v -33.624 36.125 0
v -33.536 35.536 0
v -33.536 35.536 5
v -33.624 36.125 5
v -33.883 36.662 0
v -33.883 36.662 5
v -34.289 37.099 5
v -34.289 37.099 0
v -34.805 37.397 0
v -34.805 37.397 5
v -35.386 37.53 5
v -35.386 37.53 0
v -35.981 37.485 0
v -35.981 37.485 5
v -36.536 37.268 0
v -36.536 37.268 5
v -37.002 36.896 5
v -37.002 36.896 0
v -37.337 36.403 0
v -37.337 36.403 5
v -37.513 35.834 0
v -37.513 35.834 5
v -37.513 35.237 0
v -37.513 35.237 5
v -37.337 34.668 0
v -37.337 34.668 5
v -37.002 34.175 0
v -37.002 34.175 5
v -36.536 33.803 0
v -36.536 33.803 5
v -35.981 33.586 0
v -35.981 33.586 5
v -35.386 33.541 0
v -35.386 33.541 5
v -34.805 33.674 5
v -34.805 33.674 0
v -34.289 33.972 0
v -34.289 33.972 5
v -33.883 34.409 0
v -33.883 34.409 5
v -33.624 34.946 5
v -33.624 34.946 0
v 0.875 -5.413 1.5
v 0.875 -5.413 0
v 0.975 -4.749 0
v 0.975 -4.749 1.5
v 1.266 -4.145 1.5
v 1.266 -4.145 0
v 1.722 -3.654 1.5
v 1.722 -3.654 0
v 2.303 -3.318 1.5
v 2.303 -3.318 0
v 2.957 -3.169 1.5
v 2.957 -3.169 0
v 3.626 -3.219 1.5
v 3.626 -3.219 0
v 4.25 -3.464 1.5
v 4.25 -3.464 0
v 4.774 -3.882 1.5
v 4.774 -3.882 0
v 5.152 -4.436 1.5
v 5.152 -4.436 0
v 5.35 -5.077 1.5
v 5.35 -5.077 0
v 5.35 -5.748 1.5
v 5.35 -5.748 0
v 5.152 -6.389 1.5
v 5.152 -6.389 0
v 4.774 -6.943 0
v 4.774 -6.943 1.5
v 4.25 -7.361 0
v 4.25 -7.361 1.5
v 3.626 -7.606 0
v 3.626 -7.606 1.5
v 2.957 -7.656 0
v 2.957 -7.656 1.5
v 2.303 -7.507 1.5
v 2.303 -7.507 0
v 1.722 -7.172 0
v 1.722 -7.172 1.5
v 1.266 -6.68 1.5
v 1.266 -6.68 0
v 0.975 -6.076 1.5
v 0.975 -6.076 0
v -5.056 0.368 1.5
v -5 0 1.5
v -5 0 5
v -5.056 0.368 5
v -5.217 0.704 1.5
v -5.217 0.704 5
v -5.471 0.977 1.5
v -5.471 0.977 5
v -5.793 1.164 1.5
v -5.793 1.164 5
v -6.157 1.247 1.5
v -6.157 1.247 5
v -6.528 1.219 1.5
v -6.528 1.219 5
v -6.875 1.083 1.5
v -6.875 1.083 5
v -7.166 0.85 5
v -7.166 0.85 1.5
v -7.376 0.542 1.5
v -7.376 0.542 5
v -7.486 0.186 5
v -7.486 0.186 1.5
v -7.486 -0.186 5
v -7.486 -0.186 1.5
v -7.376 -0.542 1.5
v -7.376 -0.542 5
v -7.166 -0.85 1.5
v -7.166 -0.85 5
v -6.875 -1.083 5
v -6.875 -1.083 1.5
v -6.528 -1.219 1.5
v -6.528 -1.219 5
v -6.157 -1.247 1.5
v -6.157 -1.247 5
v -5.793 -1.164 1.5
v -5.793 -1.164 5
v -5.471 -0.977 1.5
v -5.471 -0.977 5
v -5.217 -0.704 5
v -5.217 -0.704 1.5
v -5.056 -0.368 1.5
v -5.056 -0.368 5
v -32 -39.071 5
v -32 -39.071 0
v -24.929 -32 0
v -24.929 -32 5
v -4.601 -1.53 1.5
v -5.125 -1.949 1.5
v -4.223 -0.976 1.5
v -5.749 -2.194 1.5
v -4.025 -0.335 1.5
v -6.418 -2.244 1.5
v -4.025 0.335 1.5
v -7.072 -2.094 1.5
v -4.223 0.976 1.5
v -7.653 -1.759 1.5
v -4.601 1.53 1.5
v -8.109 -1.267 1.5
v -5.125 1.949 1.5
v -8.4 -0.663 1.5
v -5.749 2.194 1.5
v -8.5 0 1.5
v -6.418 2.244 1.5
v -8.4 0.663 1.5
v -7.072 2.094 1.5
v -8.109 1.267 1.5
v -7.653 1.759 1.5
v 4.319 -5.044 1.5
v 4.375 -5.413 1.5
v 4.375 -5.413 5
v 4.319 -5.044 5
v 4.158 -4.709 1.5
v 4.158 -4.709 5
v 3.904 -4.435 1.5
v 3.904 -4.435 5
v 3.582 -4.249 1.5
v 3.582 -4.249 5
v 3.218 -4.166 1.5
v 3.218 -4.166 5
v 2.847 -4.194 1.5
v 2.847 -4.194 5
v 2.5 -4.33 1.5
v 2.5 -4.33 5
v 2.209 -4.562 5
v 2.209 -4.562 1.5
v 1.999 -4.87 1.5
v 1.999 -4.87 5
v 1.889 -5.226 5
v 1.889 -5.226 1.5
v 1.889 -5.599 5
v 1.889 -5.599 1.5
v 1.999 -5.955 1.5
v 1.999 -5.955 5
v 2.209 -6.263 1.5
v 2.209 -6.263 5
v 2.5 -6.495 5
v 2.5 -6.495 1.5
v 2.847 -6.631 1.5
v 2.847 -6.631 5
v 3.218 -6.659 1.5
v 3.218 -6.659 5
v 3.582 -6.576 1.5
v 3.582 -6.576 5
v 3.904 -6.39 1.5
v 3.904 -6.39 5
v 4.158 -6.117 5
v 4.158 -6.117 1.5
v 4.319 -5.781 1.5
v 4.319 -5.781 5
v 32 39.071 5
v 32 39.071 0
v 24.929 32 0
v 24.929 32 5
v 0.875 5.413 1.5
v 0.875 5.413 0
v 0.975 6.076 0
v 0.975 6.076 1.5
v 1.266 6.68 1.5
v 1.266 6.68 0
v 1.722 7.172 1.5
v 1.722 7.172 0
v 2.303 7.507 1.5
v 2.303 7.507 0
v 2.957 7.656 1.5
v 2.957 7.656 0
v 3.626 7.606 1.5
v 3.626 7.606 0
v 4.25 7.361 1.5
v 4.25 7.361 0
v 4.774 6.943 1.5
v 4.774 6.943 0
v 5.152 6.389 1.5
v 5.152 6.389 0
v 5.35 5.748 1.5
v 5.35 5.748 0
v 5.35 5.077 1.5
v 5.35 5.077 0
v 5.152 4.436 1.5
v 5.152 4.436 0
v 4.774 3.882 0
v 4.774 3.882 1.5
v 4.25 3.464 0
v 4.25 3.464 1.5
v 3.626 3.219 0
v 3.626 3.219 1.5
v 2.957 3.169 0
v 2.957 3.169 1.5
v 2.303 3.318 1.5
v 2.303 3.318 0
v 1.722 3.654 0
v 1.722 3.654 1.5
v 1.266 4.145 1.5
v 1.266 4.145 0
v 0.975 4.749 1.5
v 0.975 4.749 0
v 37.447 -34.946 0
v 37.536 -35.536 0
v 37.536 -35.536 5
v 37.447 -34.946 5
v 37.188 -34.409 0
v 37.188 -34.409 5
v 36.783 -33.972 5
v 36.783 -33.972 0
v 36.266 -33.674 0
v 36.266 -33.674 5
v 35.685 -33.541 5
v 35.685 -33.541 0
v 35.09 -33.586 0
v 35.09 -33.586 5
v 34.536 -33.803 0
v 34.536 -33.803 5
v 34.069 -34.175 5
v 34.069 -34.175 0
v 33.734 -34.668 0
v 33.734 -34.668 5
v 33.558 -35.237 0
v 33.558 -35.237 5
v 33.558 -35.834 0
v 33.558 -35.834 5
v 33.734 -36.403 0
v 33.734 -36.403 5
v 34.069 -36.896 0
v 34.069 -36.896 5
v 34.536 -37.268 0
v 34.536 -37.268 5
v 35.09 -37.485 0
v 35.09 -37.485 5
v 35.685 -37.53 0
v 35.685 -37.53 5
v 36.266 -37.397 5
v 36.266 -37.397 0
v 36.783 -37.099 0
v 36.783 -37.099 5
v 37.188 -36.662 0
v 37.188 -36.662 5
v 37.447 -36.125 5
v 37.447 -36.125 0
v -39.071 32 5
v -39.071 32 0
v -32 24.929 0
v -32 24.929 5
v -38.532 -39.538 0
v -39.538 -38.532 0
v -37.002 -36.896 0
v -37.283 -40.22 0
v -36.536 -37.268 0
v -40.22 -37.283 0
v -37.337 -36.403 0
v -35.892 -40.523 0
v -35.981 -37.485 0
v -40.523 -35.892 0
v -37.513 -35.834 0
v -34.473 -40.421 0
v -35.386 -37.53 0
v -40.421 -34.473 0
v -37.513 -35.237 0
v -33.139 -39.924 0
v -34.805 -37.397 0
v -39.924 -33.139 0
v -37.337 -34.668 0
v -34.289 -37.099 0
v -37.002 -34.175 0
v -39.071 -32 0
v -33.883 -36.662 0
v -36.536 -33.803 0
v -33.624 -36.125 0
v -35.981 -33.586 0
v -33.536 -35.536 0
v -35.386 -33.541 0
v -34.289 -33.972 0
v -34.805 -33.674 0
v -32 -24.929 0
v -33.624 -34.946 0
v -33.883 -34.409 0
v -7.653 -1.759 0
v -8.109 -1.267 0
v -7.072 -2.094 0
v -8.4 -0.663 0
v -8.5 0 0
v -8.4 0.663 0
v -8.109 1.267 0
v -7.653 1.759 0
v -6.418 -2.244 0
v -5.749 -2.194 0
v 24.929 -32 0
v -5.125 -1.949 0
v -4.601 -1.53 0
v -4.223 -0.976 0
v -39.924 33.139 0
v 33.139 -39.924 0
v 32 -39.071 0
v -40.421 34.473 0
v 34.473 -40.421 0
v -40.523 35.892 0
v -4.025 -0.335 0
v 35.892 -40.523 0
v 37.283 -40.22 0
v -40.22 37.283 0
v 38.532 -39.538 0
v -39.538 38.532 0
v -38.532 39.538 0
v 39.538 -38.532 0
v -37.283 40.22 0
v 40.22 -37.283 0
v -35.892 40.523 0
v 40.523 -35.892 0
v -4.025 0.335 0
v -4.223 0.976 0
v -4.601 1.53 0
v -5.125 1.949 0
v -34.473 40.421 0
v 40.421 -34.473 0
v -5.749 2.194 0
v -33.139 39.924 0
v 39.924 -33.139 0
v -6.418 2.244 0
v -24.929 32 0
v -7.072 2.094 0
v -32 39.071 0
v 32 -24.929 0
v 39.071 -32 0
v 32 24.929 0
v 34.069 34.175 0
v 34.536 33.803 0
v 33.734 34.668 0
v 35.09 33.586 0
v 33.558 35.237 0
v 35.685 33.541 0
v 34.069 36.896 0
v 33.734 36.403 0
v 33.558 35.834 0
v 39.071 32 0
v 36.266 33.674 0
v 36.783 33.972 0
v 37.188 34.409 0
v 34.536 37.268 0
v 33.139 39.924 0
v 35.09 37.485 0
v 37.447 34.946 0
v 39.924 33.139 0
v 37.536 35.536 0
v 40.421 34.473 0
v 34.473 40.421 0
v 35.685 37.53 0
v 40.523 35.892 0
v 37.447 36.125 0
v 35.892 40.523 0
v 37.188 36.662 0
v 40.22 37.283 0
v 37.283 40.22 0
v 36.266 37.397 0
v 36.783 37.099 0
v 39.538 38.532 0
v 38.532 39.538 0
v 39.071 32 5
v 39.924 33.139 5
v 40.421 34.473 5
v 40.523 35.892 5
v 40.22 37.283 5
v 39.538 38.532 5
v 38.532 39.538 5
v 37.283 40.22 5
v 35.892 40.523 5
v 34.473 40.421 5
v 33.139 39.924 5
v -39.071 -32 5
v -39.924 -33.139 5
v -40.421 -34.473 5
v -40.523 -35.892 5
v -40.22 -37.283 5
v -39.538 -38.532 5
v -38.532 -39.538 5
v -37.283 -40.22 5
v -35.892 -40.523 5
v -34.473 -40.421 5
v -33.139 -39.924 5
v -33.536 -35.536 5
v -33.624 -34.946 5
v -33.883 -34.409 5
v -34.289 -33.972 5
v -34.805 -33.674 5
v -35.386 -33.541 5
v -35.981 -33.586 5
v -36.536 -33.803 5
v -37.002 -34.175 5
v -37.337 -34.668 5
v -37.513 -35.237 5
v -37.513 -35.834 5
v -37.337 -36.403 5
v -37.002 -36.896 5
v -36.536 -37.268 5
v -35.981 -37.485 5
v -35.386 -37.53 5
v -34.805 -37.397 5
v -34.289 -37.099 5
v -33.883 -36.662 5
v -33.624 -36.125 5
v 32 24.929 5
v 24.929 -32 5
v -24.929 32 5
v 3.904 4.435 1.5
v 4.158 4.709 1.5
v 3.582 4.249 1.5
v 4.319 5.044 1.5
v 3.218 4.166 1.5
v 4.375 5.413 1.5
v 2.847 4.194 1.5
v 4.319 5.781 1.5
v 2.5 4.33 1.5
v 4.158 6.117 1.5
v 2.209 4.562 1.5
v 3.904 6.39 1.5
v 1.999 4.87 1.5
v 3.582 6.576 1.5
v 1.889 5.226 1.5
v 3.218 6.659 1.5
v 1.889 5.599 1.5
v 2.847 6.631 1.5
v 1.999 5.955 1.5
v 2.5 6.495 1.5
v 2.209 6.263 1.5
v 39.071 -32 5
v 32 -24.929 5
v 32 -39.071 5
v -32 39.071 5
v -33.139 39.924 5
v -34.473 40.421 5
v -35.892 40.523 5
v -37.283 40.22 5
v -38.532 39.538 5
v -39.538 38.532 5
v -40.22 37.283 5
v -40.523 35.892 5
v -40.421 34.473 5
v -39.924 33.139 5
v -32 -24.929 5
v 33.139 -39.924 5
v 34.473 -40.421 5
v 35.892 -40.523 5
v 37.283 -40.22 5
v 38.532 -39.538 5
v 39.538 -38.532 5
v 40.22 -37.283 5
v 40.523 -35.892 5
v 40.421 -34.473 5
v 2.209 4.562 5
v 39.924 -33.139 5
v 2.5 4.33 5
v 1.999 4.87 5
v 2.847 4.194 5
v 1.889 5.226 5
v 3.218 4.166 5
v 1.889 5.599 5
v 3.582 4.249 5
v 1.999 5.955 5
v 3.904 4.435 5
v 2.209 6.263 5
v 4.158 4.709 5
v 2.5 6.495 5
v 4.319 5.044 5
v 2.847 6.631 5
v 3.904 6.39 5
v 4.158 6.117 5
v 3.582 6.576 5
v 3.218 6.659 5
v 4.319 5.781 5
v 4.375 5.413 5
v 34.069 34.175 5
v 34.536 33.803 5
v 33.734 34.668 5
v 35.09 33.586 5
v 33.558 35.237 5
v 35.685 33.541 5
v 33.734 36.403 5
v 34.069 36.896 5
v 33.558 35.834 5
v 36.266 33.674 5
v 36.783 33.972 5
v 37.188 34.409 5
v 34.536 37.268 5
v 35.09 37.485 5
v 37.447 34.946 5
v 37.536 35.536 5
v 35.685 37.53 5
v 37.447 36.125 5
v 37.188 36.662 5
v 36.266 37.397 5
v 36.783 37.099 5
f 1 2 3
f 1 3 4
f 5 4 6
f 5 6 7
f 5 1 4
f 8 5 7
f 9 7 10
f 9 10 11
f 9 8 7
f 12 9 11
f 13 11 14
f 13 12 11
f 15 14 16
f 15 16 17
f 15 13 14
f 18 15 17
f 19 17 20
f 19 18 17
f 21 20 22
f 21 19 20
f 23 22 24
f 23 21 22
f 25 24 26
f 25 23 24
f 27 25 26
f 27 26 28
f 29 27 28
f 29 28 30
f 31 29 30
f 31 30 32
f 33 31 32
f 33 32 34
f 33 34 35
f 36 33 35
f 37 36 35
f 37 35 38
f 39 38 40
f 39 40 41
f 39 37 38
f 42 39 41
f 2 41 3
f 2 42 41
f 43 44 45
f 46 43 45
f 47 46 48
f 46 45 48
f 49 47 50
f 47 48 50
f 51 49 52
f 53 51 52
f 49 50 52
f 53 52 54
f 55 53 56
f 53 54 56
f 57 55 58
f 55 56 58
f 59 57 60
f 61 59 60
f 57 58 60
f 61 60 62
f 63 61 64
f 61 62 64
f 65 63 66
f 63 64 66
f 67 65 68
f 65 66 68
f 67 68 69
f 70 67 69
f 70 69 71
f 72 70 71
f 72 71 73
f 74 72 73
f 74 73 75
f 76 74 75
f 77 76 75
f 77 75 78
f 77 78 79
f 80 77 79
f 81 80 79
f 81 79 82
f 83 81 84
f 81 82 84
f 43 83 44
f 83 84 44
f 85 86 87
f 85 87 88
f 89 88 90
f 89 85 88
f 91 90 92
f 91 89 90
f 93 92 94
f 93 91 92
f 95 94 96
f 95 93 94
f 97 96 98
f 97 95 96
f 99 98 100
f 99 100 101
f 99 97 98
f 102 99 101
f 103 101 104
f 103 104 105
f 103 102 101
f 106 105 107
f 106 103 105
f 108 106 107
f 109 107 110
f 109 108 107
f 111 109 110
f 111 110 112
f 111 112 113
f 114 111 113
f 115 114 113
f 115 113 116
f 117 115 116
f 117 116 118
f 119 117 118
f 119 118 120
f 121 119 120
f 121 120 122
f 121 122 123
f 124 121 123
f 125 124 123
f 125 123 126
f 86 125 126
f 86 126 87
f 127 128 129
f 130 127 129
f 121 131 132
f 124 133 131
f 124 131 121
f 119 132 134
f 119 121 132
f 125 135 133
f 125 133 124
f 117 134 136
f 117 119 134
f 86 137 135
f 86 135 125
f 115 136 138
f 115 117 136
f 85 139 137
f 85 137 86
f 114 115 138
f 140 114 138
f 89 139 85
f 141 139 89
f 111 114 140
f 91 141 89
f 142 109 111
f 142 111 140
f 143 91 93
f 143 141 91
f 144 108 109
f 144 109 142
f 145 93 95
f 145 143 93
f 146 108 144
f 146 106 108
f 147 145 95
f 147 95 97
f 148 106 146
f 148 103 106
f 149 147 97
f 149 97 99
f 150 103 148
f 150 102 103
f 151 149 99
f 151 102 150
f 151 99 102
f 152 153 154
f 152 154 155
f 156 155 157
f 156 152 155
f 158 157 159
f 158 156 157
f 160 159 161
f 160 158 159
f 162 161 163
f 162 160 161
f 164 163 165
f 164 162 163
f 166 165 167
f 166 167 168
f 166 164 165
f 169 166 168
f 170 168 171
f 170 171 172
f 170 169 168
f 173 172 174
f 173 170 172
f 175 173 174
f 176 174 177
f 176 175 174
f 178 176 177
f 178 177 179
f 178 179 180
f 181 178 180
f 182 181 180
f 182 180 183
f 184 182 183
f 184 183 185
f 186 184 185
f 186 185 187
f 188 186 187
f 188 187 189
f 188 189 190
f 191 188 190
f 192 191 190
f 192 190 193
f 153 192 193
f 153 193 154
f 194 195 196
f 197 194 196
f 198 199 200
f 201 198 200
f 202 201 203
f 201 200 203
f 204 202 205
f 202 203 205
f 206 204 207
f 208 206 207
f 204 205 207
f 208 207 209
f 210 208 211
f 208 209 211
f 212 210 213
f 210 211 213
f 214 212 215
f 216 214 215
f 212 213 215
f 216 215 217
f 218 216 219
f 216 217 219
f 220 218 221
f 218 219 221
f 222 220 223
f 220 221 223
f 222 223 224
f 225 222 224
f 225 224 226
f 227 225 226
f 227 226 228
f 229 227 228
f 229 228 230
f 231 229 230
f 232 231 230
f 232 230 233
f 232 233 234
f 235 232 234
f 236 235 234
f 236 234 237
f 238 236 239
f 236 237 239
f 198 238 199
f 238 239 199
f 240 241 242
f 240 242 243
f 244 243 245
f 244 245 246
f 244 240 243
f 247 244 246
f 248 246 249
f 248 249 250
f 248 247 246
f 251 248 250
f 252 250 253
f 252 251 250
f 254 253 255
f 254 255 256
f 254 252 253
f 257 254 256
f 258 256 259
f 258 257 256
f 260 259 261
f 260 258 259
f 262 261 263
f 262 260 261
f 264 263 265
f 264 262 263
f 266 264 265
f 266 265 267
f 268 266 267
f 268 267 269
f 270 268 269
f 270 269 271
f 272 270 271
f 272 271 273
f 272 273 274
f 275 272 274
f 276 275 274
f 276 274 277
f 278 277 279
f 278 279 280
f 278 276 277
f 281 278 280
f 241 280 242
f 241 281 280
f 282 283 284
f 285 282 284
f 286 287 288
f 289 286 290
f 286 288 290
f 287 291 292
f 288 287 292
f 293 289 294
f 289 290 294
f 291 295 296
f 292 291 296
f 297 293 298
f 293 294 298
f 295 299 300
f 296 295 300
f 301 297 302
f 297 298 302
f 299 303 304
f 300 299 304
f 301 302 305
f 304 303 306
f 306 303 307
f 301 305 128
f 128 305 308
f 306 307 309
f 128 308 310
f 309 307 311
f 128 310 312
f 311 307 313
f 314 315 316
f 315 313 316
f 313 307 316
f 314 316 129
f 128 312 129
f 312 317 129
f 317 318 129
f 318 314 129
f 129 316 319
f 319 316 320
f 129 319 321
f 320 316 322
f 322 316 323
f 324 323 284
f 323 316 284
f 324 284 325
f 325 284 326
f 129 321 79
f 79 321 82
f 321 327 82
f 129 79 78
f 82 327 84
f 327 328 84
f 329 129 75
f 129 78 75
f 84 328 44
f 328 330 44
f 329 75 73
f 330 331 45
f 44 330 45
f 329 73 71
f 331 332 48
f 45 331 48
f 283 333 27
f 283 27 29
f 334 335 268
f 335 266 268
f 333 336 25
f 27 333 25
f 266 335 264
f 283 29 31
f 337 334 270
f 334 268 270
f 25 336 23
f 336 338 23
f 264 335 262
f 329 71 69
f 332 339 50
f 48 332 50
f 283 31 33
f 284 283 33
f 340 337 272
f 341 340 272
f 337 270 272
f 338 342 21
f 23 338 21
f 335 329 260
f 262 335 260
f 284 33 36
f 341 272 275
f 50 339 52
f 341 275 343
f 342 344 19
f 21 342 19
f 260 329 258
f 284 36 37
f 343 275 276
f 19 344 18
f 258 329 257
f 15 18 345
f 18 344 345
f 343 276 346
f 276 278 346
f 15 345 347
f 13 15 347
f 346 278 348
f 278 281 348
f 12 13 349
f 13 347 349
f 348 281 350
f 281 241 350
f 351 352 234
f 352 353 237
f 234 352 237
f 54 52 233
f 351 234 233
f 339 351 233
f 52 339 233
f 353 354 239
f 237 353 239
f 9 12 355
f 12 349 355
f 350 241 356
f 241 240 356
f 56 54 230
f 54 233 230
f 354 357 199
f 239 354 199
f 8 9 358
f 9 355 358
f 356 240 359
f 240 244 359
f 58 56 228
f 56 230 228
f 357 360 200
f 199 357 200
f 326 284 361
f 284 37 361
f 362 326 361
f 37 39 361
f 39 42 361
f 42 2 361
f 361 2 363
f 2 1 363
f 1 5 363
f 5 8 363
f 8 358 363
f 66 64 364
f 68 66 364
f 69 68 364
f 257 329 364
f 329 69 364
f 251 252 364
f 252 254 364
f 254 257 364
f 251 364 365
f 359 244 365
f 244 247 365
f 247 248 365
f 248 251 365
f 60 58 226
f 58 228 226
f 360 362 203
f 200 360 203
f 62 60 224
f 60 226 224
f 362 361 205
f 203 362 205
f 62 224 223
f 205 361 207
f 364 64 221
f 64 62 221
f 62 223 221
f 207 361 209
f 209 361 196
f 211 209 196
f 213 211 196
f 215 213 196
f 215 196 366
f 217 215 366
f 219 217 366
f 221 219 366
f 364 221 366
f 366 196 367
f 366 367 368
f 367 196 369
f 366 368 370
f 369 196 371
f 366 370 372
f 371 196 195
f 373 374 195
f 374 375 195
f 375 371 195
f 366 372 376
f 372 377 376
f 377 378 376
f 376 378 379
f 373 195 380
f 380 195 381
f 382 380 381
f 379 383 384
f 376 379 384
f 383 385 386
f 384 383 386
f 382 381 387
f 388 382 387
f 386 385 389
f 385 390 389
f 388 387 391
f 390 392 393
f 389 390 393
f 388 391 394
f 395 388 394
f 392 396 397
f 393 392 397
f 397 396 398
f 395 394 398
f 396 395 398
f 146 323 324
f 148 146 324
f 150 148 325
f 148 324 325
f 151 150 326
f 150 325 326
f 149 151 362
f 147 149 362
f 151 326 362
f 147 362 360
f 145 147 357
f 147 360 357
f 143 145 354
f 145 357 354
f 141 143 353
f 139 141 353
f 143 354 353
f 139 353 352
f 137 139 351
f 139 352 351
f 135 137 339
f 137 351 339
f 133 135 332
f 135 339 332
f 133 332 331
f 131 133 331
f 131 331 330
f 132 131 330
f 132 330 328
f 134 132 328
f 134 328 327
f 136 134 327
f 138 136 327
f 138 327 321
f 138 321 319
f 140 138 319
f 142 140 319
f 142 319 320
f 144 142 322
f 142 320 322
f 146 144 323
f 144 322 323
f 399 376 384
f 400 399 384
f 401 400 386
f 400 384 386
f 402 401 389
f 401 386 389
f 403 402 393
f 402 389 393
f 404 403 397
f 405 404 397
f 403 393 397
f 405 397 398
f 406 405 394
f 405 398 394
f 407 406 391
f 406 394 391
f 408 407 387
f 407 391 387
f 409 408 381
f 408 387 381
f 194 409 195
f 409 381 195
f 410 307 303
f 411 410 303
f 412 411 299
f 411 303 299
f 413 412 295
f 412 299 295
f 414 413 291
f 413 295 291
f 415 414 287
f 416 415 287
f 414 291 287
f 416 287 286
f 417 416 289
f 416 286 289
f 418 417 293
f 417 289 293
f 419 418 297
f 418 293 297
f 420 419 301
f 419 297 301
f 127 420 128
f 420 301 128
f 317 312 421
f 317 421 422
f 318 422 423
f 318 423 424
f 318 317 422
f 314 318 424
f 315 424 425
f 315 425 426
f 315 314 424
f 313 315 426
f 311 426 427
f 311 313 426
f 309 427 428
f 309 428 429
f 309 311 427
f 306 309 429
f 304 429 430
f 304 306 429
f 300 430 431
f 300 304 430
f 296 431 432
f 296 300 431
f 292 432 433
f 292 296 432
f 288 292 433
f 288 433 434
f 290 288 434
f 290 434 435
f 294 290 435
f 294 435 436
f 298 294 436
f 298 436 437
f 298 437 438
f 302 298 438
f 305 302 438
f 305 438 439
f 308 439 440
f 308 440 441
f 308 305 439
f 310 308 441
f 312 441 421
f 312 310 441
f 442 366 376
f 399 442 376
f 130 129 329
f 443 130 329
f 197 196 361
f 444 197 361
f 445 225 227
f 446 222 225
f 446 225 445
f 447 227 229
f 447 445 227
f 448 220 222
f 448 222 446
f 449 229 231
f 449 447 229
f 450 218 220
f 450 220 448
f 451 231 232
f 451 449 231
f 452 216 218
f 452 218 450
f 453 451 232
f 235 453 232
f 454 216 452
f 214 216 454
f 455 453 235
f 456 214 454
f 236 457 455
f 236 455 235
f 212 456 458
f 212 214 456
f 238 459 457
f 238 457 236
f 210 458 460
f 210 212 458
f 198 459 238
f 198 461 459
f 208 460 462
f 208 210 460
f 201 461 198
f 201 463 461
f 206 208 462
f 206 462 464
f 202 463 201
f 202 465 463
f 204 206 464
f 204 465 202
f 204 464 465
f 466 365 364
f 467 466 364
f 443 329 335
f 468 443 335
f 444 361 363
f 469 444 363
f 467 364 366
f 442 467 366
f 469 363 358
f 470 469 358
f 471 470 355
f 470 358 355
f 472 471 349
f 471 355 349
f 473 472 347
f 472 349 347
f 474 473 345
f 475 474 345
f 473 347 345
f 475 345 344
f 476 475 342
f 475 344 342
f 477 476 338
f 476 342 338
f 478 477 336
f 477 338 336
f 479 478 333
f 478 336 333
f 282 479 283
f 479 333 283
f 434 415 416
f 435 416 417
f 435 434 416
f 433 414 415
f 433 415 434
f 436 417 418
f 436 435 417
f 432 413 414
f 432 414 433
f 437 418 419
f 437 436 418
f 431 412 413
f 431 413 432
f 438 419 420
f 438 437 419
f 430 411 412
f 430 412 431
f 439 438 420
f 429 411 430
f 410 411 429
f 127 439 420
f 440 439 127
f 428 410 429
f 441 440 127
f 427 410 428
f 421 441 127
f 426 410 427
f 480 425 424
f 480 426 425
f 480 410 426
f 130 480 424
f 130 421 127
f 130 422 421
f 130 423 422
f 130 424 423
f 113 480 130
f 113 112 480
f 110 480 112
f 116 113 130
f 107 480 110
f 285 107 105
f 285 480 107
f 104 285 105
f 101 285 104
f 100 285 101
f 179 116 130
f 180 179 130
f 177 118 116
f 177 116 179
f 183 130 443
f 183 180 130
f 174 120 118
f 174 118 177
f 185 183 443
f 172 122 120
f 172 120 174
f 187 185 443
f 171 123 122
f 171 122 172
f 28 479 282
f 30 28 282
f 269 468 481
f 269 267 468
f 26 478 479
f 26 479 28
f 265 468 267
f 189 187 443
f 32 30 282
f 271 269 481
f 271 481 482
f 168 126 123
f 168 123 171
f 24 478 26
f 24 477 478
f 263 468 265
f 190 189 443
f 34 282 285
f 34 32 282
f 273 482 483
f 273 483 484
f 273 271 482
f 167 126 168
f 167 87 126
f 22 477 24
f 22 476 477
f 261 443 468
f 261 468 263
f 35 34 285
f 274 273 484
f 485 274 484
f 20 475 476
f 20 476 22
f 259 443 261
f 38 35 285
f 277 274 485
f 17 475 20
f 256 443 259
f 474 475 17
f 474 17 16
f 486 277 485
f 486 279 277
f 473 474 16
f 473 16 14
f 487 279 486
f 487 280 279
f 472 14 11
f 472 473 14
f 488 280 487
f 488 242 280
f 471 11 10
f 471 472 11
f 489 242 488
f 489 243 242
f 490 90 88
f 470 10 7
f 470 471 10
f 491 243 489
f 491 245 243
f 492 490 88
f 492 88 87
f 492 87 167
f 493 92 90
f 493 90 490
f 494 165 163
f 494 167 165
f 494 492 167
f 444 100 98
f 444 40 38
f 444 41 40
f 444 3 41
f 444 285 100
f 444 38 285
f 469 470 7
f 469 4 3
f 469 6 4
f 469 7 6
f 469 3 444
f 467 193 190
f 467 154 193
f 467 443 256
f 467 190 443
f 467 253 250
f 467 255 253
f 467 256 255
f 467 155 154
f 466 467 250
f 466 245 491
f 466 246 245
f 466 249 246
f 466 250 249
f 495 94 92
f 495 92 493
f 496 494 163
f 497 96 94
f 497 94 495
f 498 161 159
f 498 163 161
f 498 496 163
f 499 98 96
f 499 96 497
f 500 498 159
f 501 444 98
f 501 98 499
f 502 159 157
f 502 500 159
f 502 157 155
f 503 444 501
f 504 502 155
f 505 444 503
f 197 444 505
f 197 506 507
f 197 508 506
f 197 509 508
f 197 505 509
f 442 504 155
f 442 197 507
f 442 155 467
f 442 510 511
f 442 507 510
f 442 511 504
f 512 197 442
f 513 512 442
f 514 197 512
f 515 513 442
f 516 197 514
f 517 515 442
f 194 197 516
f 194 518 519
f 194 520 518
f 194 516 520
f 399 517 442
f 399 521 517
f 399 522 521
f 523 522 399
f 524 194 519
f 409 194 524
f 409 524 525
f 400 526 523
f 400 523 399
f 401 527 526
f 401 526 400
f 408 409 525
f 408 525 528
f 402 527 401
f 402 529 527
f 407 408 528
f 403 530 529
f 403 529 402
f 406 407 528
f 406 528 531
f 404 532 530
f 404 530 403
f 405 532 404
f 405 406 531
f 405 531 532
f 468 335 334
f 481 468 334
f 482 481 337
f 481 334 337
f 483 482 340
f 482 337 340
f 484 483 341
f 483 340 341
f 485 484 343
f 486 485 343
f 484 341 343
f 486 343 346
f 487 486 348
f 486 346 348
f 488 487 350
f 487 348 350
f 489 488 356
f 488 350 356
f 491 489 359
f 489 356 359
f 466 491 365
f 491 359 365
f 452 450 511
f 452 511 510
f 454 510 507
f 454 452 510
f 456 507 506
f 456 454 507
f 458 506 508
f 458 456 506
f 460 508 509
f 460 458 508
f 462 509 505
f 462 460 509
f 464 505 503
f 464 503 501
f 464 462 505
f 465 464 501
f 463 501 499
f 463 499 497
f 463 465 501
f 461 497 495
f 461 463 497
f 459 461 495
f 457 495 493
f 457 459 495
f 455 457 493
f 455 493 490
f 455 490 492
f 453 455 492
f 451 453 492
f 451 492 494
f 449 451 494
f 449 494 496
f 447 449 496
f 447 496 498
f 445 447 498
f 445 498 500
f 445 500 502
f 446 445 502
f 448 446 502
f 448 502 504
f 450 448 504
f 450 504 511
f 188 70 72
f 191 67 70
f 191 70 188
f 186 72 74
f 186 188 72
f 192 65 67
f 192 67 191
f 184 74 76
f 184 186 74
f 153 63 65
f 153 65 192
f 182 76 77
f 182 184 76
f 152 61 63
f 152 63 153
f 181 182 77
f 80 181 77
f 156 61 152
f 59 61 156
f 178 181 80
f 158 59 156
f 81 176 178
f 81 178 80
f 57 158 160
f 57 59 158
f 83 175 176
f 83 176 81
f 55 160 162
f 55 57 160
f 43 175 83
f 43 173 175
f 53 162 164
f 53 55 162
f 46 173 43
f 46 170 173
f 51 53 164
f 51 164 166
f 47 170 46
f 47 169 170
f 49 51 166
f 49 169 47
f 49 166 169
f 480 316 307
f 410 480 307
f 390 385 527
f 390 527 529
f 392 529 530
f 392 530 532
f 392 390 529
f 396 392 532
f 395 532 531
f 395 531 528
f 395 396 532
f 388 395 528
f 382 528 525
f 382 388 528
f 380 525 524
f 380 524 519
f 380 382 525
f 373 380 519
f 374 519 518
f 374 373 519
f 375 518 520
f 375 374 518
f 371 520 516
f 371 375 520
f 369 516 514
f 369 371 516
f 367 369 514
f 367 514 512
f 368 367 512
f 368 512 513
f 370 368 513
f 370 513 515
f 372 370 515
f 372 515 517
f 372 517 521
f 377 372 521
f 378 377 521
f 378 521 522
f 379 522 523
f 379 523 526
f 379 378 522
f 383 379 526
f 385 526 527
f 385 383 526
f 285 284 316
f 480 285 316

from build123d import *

# Parameters (mm, degrees)
SKETCH1_R           = 1.25
SKETCH1_R_2         = 2
BOSS_EXTRUDE1_DEPTH = 5
SKETCH2_R           = 2.25
CUT_EXTRUDE1_DEPTH  = 1.5


with BuildPart() as part:
    # Sketch1 → Boss-Extrude1 (new body)
    with BuildSketch(Plane.XY):
        with BuildLine():
            Line((-32, -24.928932188), (-39.071067812, -32))
            ThreePointArc((-39.071067812, -32), (-39.071067812, -39.071067812), (-32, -39.071067812))
            Line((-32, -39.071067812), (-24.928932188, -32))
            Line((-24.928932188, -32), (24.928932188, -32))
            Line((24.928932188, -32), (32, -39.071067812))
            ThreePointArc((32, -39.071067812), (39.071067812, -39.071067812), (39.071067812, -32))
            Line((39.071067812, -32), (32, -24.928932188))
            Line((32, -24.928932188), (32, 24.928932188))
            Line((32, 24.928932188), (39.071067812, 32))
            ThreePointArc((39.071067812, 32), (39.071067812, 39.071067812), (32, 39.071067812))
            Line((32, 39.071067812), (24.928932188, 32))
            Line((24.928932188, 32), (-24.928932188, 32))
            Line((-24.928932188, 32), (-32, 39.071067812))
            ThreePointArc((-32, 39.071067812), (-39.071067812, 39.071067812), (-39.071067812, 32))
            Line((-39.071067812, 32), (-32, 24.928932188))
            Line((-32, 24.928932188), (-32, -24.928932188))
        make_face()
        with Locations((3.125, -5.412658774)):
            Circle(SKETCH1_R, mode=Mode.SUBTRACT)
        with Locations((-6.25, 0)):
            Circle(SKETCH1_R, mode=Mode.SUBTRACT)
        with Locations((3.125, 5.412658774)):
            Circle(SKETCH1_R, mode=Mode.SUBTRACT)
        with Locations((-35.535533906, -35.535533906)):
            Circle(SKETCH1_R_2, mode=Mode.SUBTRACT)
        with Locations((35.535533906, -35.535533906)):
            Circle(SKETCH1_R_2, mode=Mode.SUBTRACT)
        with Locations((35.535533906, 35.535533906)):
            Circle(SKETCH1_R_2, mode=Mode.SUBTRACT)
        with Locations((-35.535533906, 35.535533906)):
            Circle(SKETCH1_R_2, mode=Mode.SUBTRACT)
    extrude(amount=BOSS_EXTRUDE1_DEPTH)

    # Sketch2 → Cut-Extrude1 (cut)
    with BuildSketch(Plane(origin=(0, 0, 0), x_dir=(-1, 0, 0), z_dir=(0, 0, -1))):
        with Locations((-3.125, 5.412658774)):
            Circle(SKETCH2_R)
        with Locations((-3.125, -5.412658774)):
            Circle(SKETCH2_R)
        with Locations((6.25, 0)):
            Circle(SKETCH2_R)
    extrude(amount=-CUT_EXTRUDE1_DEPTH, mode=Mode.SUBTRACT)


solid = part.part
